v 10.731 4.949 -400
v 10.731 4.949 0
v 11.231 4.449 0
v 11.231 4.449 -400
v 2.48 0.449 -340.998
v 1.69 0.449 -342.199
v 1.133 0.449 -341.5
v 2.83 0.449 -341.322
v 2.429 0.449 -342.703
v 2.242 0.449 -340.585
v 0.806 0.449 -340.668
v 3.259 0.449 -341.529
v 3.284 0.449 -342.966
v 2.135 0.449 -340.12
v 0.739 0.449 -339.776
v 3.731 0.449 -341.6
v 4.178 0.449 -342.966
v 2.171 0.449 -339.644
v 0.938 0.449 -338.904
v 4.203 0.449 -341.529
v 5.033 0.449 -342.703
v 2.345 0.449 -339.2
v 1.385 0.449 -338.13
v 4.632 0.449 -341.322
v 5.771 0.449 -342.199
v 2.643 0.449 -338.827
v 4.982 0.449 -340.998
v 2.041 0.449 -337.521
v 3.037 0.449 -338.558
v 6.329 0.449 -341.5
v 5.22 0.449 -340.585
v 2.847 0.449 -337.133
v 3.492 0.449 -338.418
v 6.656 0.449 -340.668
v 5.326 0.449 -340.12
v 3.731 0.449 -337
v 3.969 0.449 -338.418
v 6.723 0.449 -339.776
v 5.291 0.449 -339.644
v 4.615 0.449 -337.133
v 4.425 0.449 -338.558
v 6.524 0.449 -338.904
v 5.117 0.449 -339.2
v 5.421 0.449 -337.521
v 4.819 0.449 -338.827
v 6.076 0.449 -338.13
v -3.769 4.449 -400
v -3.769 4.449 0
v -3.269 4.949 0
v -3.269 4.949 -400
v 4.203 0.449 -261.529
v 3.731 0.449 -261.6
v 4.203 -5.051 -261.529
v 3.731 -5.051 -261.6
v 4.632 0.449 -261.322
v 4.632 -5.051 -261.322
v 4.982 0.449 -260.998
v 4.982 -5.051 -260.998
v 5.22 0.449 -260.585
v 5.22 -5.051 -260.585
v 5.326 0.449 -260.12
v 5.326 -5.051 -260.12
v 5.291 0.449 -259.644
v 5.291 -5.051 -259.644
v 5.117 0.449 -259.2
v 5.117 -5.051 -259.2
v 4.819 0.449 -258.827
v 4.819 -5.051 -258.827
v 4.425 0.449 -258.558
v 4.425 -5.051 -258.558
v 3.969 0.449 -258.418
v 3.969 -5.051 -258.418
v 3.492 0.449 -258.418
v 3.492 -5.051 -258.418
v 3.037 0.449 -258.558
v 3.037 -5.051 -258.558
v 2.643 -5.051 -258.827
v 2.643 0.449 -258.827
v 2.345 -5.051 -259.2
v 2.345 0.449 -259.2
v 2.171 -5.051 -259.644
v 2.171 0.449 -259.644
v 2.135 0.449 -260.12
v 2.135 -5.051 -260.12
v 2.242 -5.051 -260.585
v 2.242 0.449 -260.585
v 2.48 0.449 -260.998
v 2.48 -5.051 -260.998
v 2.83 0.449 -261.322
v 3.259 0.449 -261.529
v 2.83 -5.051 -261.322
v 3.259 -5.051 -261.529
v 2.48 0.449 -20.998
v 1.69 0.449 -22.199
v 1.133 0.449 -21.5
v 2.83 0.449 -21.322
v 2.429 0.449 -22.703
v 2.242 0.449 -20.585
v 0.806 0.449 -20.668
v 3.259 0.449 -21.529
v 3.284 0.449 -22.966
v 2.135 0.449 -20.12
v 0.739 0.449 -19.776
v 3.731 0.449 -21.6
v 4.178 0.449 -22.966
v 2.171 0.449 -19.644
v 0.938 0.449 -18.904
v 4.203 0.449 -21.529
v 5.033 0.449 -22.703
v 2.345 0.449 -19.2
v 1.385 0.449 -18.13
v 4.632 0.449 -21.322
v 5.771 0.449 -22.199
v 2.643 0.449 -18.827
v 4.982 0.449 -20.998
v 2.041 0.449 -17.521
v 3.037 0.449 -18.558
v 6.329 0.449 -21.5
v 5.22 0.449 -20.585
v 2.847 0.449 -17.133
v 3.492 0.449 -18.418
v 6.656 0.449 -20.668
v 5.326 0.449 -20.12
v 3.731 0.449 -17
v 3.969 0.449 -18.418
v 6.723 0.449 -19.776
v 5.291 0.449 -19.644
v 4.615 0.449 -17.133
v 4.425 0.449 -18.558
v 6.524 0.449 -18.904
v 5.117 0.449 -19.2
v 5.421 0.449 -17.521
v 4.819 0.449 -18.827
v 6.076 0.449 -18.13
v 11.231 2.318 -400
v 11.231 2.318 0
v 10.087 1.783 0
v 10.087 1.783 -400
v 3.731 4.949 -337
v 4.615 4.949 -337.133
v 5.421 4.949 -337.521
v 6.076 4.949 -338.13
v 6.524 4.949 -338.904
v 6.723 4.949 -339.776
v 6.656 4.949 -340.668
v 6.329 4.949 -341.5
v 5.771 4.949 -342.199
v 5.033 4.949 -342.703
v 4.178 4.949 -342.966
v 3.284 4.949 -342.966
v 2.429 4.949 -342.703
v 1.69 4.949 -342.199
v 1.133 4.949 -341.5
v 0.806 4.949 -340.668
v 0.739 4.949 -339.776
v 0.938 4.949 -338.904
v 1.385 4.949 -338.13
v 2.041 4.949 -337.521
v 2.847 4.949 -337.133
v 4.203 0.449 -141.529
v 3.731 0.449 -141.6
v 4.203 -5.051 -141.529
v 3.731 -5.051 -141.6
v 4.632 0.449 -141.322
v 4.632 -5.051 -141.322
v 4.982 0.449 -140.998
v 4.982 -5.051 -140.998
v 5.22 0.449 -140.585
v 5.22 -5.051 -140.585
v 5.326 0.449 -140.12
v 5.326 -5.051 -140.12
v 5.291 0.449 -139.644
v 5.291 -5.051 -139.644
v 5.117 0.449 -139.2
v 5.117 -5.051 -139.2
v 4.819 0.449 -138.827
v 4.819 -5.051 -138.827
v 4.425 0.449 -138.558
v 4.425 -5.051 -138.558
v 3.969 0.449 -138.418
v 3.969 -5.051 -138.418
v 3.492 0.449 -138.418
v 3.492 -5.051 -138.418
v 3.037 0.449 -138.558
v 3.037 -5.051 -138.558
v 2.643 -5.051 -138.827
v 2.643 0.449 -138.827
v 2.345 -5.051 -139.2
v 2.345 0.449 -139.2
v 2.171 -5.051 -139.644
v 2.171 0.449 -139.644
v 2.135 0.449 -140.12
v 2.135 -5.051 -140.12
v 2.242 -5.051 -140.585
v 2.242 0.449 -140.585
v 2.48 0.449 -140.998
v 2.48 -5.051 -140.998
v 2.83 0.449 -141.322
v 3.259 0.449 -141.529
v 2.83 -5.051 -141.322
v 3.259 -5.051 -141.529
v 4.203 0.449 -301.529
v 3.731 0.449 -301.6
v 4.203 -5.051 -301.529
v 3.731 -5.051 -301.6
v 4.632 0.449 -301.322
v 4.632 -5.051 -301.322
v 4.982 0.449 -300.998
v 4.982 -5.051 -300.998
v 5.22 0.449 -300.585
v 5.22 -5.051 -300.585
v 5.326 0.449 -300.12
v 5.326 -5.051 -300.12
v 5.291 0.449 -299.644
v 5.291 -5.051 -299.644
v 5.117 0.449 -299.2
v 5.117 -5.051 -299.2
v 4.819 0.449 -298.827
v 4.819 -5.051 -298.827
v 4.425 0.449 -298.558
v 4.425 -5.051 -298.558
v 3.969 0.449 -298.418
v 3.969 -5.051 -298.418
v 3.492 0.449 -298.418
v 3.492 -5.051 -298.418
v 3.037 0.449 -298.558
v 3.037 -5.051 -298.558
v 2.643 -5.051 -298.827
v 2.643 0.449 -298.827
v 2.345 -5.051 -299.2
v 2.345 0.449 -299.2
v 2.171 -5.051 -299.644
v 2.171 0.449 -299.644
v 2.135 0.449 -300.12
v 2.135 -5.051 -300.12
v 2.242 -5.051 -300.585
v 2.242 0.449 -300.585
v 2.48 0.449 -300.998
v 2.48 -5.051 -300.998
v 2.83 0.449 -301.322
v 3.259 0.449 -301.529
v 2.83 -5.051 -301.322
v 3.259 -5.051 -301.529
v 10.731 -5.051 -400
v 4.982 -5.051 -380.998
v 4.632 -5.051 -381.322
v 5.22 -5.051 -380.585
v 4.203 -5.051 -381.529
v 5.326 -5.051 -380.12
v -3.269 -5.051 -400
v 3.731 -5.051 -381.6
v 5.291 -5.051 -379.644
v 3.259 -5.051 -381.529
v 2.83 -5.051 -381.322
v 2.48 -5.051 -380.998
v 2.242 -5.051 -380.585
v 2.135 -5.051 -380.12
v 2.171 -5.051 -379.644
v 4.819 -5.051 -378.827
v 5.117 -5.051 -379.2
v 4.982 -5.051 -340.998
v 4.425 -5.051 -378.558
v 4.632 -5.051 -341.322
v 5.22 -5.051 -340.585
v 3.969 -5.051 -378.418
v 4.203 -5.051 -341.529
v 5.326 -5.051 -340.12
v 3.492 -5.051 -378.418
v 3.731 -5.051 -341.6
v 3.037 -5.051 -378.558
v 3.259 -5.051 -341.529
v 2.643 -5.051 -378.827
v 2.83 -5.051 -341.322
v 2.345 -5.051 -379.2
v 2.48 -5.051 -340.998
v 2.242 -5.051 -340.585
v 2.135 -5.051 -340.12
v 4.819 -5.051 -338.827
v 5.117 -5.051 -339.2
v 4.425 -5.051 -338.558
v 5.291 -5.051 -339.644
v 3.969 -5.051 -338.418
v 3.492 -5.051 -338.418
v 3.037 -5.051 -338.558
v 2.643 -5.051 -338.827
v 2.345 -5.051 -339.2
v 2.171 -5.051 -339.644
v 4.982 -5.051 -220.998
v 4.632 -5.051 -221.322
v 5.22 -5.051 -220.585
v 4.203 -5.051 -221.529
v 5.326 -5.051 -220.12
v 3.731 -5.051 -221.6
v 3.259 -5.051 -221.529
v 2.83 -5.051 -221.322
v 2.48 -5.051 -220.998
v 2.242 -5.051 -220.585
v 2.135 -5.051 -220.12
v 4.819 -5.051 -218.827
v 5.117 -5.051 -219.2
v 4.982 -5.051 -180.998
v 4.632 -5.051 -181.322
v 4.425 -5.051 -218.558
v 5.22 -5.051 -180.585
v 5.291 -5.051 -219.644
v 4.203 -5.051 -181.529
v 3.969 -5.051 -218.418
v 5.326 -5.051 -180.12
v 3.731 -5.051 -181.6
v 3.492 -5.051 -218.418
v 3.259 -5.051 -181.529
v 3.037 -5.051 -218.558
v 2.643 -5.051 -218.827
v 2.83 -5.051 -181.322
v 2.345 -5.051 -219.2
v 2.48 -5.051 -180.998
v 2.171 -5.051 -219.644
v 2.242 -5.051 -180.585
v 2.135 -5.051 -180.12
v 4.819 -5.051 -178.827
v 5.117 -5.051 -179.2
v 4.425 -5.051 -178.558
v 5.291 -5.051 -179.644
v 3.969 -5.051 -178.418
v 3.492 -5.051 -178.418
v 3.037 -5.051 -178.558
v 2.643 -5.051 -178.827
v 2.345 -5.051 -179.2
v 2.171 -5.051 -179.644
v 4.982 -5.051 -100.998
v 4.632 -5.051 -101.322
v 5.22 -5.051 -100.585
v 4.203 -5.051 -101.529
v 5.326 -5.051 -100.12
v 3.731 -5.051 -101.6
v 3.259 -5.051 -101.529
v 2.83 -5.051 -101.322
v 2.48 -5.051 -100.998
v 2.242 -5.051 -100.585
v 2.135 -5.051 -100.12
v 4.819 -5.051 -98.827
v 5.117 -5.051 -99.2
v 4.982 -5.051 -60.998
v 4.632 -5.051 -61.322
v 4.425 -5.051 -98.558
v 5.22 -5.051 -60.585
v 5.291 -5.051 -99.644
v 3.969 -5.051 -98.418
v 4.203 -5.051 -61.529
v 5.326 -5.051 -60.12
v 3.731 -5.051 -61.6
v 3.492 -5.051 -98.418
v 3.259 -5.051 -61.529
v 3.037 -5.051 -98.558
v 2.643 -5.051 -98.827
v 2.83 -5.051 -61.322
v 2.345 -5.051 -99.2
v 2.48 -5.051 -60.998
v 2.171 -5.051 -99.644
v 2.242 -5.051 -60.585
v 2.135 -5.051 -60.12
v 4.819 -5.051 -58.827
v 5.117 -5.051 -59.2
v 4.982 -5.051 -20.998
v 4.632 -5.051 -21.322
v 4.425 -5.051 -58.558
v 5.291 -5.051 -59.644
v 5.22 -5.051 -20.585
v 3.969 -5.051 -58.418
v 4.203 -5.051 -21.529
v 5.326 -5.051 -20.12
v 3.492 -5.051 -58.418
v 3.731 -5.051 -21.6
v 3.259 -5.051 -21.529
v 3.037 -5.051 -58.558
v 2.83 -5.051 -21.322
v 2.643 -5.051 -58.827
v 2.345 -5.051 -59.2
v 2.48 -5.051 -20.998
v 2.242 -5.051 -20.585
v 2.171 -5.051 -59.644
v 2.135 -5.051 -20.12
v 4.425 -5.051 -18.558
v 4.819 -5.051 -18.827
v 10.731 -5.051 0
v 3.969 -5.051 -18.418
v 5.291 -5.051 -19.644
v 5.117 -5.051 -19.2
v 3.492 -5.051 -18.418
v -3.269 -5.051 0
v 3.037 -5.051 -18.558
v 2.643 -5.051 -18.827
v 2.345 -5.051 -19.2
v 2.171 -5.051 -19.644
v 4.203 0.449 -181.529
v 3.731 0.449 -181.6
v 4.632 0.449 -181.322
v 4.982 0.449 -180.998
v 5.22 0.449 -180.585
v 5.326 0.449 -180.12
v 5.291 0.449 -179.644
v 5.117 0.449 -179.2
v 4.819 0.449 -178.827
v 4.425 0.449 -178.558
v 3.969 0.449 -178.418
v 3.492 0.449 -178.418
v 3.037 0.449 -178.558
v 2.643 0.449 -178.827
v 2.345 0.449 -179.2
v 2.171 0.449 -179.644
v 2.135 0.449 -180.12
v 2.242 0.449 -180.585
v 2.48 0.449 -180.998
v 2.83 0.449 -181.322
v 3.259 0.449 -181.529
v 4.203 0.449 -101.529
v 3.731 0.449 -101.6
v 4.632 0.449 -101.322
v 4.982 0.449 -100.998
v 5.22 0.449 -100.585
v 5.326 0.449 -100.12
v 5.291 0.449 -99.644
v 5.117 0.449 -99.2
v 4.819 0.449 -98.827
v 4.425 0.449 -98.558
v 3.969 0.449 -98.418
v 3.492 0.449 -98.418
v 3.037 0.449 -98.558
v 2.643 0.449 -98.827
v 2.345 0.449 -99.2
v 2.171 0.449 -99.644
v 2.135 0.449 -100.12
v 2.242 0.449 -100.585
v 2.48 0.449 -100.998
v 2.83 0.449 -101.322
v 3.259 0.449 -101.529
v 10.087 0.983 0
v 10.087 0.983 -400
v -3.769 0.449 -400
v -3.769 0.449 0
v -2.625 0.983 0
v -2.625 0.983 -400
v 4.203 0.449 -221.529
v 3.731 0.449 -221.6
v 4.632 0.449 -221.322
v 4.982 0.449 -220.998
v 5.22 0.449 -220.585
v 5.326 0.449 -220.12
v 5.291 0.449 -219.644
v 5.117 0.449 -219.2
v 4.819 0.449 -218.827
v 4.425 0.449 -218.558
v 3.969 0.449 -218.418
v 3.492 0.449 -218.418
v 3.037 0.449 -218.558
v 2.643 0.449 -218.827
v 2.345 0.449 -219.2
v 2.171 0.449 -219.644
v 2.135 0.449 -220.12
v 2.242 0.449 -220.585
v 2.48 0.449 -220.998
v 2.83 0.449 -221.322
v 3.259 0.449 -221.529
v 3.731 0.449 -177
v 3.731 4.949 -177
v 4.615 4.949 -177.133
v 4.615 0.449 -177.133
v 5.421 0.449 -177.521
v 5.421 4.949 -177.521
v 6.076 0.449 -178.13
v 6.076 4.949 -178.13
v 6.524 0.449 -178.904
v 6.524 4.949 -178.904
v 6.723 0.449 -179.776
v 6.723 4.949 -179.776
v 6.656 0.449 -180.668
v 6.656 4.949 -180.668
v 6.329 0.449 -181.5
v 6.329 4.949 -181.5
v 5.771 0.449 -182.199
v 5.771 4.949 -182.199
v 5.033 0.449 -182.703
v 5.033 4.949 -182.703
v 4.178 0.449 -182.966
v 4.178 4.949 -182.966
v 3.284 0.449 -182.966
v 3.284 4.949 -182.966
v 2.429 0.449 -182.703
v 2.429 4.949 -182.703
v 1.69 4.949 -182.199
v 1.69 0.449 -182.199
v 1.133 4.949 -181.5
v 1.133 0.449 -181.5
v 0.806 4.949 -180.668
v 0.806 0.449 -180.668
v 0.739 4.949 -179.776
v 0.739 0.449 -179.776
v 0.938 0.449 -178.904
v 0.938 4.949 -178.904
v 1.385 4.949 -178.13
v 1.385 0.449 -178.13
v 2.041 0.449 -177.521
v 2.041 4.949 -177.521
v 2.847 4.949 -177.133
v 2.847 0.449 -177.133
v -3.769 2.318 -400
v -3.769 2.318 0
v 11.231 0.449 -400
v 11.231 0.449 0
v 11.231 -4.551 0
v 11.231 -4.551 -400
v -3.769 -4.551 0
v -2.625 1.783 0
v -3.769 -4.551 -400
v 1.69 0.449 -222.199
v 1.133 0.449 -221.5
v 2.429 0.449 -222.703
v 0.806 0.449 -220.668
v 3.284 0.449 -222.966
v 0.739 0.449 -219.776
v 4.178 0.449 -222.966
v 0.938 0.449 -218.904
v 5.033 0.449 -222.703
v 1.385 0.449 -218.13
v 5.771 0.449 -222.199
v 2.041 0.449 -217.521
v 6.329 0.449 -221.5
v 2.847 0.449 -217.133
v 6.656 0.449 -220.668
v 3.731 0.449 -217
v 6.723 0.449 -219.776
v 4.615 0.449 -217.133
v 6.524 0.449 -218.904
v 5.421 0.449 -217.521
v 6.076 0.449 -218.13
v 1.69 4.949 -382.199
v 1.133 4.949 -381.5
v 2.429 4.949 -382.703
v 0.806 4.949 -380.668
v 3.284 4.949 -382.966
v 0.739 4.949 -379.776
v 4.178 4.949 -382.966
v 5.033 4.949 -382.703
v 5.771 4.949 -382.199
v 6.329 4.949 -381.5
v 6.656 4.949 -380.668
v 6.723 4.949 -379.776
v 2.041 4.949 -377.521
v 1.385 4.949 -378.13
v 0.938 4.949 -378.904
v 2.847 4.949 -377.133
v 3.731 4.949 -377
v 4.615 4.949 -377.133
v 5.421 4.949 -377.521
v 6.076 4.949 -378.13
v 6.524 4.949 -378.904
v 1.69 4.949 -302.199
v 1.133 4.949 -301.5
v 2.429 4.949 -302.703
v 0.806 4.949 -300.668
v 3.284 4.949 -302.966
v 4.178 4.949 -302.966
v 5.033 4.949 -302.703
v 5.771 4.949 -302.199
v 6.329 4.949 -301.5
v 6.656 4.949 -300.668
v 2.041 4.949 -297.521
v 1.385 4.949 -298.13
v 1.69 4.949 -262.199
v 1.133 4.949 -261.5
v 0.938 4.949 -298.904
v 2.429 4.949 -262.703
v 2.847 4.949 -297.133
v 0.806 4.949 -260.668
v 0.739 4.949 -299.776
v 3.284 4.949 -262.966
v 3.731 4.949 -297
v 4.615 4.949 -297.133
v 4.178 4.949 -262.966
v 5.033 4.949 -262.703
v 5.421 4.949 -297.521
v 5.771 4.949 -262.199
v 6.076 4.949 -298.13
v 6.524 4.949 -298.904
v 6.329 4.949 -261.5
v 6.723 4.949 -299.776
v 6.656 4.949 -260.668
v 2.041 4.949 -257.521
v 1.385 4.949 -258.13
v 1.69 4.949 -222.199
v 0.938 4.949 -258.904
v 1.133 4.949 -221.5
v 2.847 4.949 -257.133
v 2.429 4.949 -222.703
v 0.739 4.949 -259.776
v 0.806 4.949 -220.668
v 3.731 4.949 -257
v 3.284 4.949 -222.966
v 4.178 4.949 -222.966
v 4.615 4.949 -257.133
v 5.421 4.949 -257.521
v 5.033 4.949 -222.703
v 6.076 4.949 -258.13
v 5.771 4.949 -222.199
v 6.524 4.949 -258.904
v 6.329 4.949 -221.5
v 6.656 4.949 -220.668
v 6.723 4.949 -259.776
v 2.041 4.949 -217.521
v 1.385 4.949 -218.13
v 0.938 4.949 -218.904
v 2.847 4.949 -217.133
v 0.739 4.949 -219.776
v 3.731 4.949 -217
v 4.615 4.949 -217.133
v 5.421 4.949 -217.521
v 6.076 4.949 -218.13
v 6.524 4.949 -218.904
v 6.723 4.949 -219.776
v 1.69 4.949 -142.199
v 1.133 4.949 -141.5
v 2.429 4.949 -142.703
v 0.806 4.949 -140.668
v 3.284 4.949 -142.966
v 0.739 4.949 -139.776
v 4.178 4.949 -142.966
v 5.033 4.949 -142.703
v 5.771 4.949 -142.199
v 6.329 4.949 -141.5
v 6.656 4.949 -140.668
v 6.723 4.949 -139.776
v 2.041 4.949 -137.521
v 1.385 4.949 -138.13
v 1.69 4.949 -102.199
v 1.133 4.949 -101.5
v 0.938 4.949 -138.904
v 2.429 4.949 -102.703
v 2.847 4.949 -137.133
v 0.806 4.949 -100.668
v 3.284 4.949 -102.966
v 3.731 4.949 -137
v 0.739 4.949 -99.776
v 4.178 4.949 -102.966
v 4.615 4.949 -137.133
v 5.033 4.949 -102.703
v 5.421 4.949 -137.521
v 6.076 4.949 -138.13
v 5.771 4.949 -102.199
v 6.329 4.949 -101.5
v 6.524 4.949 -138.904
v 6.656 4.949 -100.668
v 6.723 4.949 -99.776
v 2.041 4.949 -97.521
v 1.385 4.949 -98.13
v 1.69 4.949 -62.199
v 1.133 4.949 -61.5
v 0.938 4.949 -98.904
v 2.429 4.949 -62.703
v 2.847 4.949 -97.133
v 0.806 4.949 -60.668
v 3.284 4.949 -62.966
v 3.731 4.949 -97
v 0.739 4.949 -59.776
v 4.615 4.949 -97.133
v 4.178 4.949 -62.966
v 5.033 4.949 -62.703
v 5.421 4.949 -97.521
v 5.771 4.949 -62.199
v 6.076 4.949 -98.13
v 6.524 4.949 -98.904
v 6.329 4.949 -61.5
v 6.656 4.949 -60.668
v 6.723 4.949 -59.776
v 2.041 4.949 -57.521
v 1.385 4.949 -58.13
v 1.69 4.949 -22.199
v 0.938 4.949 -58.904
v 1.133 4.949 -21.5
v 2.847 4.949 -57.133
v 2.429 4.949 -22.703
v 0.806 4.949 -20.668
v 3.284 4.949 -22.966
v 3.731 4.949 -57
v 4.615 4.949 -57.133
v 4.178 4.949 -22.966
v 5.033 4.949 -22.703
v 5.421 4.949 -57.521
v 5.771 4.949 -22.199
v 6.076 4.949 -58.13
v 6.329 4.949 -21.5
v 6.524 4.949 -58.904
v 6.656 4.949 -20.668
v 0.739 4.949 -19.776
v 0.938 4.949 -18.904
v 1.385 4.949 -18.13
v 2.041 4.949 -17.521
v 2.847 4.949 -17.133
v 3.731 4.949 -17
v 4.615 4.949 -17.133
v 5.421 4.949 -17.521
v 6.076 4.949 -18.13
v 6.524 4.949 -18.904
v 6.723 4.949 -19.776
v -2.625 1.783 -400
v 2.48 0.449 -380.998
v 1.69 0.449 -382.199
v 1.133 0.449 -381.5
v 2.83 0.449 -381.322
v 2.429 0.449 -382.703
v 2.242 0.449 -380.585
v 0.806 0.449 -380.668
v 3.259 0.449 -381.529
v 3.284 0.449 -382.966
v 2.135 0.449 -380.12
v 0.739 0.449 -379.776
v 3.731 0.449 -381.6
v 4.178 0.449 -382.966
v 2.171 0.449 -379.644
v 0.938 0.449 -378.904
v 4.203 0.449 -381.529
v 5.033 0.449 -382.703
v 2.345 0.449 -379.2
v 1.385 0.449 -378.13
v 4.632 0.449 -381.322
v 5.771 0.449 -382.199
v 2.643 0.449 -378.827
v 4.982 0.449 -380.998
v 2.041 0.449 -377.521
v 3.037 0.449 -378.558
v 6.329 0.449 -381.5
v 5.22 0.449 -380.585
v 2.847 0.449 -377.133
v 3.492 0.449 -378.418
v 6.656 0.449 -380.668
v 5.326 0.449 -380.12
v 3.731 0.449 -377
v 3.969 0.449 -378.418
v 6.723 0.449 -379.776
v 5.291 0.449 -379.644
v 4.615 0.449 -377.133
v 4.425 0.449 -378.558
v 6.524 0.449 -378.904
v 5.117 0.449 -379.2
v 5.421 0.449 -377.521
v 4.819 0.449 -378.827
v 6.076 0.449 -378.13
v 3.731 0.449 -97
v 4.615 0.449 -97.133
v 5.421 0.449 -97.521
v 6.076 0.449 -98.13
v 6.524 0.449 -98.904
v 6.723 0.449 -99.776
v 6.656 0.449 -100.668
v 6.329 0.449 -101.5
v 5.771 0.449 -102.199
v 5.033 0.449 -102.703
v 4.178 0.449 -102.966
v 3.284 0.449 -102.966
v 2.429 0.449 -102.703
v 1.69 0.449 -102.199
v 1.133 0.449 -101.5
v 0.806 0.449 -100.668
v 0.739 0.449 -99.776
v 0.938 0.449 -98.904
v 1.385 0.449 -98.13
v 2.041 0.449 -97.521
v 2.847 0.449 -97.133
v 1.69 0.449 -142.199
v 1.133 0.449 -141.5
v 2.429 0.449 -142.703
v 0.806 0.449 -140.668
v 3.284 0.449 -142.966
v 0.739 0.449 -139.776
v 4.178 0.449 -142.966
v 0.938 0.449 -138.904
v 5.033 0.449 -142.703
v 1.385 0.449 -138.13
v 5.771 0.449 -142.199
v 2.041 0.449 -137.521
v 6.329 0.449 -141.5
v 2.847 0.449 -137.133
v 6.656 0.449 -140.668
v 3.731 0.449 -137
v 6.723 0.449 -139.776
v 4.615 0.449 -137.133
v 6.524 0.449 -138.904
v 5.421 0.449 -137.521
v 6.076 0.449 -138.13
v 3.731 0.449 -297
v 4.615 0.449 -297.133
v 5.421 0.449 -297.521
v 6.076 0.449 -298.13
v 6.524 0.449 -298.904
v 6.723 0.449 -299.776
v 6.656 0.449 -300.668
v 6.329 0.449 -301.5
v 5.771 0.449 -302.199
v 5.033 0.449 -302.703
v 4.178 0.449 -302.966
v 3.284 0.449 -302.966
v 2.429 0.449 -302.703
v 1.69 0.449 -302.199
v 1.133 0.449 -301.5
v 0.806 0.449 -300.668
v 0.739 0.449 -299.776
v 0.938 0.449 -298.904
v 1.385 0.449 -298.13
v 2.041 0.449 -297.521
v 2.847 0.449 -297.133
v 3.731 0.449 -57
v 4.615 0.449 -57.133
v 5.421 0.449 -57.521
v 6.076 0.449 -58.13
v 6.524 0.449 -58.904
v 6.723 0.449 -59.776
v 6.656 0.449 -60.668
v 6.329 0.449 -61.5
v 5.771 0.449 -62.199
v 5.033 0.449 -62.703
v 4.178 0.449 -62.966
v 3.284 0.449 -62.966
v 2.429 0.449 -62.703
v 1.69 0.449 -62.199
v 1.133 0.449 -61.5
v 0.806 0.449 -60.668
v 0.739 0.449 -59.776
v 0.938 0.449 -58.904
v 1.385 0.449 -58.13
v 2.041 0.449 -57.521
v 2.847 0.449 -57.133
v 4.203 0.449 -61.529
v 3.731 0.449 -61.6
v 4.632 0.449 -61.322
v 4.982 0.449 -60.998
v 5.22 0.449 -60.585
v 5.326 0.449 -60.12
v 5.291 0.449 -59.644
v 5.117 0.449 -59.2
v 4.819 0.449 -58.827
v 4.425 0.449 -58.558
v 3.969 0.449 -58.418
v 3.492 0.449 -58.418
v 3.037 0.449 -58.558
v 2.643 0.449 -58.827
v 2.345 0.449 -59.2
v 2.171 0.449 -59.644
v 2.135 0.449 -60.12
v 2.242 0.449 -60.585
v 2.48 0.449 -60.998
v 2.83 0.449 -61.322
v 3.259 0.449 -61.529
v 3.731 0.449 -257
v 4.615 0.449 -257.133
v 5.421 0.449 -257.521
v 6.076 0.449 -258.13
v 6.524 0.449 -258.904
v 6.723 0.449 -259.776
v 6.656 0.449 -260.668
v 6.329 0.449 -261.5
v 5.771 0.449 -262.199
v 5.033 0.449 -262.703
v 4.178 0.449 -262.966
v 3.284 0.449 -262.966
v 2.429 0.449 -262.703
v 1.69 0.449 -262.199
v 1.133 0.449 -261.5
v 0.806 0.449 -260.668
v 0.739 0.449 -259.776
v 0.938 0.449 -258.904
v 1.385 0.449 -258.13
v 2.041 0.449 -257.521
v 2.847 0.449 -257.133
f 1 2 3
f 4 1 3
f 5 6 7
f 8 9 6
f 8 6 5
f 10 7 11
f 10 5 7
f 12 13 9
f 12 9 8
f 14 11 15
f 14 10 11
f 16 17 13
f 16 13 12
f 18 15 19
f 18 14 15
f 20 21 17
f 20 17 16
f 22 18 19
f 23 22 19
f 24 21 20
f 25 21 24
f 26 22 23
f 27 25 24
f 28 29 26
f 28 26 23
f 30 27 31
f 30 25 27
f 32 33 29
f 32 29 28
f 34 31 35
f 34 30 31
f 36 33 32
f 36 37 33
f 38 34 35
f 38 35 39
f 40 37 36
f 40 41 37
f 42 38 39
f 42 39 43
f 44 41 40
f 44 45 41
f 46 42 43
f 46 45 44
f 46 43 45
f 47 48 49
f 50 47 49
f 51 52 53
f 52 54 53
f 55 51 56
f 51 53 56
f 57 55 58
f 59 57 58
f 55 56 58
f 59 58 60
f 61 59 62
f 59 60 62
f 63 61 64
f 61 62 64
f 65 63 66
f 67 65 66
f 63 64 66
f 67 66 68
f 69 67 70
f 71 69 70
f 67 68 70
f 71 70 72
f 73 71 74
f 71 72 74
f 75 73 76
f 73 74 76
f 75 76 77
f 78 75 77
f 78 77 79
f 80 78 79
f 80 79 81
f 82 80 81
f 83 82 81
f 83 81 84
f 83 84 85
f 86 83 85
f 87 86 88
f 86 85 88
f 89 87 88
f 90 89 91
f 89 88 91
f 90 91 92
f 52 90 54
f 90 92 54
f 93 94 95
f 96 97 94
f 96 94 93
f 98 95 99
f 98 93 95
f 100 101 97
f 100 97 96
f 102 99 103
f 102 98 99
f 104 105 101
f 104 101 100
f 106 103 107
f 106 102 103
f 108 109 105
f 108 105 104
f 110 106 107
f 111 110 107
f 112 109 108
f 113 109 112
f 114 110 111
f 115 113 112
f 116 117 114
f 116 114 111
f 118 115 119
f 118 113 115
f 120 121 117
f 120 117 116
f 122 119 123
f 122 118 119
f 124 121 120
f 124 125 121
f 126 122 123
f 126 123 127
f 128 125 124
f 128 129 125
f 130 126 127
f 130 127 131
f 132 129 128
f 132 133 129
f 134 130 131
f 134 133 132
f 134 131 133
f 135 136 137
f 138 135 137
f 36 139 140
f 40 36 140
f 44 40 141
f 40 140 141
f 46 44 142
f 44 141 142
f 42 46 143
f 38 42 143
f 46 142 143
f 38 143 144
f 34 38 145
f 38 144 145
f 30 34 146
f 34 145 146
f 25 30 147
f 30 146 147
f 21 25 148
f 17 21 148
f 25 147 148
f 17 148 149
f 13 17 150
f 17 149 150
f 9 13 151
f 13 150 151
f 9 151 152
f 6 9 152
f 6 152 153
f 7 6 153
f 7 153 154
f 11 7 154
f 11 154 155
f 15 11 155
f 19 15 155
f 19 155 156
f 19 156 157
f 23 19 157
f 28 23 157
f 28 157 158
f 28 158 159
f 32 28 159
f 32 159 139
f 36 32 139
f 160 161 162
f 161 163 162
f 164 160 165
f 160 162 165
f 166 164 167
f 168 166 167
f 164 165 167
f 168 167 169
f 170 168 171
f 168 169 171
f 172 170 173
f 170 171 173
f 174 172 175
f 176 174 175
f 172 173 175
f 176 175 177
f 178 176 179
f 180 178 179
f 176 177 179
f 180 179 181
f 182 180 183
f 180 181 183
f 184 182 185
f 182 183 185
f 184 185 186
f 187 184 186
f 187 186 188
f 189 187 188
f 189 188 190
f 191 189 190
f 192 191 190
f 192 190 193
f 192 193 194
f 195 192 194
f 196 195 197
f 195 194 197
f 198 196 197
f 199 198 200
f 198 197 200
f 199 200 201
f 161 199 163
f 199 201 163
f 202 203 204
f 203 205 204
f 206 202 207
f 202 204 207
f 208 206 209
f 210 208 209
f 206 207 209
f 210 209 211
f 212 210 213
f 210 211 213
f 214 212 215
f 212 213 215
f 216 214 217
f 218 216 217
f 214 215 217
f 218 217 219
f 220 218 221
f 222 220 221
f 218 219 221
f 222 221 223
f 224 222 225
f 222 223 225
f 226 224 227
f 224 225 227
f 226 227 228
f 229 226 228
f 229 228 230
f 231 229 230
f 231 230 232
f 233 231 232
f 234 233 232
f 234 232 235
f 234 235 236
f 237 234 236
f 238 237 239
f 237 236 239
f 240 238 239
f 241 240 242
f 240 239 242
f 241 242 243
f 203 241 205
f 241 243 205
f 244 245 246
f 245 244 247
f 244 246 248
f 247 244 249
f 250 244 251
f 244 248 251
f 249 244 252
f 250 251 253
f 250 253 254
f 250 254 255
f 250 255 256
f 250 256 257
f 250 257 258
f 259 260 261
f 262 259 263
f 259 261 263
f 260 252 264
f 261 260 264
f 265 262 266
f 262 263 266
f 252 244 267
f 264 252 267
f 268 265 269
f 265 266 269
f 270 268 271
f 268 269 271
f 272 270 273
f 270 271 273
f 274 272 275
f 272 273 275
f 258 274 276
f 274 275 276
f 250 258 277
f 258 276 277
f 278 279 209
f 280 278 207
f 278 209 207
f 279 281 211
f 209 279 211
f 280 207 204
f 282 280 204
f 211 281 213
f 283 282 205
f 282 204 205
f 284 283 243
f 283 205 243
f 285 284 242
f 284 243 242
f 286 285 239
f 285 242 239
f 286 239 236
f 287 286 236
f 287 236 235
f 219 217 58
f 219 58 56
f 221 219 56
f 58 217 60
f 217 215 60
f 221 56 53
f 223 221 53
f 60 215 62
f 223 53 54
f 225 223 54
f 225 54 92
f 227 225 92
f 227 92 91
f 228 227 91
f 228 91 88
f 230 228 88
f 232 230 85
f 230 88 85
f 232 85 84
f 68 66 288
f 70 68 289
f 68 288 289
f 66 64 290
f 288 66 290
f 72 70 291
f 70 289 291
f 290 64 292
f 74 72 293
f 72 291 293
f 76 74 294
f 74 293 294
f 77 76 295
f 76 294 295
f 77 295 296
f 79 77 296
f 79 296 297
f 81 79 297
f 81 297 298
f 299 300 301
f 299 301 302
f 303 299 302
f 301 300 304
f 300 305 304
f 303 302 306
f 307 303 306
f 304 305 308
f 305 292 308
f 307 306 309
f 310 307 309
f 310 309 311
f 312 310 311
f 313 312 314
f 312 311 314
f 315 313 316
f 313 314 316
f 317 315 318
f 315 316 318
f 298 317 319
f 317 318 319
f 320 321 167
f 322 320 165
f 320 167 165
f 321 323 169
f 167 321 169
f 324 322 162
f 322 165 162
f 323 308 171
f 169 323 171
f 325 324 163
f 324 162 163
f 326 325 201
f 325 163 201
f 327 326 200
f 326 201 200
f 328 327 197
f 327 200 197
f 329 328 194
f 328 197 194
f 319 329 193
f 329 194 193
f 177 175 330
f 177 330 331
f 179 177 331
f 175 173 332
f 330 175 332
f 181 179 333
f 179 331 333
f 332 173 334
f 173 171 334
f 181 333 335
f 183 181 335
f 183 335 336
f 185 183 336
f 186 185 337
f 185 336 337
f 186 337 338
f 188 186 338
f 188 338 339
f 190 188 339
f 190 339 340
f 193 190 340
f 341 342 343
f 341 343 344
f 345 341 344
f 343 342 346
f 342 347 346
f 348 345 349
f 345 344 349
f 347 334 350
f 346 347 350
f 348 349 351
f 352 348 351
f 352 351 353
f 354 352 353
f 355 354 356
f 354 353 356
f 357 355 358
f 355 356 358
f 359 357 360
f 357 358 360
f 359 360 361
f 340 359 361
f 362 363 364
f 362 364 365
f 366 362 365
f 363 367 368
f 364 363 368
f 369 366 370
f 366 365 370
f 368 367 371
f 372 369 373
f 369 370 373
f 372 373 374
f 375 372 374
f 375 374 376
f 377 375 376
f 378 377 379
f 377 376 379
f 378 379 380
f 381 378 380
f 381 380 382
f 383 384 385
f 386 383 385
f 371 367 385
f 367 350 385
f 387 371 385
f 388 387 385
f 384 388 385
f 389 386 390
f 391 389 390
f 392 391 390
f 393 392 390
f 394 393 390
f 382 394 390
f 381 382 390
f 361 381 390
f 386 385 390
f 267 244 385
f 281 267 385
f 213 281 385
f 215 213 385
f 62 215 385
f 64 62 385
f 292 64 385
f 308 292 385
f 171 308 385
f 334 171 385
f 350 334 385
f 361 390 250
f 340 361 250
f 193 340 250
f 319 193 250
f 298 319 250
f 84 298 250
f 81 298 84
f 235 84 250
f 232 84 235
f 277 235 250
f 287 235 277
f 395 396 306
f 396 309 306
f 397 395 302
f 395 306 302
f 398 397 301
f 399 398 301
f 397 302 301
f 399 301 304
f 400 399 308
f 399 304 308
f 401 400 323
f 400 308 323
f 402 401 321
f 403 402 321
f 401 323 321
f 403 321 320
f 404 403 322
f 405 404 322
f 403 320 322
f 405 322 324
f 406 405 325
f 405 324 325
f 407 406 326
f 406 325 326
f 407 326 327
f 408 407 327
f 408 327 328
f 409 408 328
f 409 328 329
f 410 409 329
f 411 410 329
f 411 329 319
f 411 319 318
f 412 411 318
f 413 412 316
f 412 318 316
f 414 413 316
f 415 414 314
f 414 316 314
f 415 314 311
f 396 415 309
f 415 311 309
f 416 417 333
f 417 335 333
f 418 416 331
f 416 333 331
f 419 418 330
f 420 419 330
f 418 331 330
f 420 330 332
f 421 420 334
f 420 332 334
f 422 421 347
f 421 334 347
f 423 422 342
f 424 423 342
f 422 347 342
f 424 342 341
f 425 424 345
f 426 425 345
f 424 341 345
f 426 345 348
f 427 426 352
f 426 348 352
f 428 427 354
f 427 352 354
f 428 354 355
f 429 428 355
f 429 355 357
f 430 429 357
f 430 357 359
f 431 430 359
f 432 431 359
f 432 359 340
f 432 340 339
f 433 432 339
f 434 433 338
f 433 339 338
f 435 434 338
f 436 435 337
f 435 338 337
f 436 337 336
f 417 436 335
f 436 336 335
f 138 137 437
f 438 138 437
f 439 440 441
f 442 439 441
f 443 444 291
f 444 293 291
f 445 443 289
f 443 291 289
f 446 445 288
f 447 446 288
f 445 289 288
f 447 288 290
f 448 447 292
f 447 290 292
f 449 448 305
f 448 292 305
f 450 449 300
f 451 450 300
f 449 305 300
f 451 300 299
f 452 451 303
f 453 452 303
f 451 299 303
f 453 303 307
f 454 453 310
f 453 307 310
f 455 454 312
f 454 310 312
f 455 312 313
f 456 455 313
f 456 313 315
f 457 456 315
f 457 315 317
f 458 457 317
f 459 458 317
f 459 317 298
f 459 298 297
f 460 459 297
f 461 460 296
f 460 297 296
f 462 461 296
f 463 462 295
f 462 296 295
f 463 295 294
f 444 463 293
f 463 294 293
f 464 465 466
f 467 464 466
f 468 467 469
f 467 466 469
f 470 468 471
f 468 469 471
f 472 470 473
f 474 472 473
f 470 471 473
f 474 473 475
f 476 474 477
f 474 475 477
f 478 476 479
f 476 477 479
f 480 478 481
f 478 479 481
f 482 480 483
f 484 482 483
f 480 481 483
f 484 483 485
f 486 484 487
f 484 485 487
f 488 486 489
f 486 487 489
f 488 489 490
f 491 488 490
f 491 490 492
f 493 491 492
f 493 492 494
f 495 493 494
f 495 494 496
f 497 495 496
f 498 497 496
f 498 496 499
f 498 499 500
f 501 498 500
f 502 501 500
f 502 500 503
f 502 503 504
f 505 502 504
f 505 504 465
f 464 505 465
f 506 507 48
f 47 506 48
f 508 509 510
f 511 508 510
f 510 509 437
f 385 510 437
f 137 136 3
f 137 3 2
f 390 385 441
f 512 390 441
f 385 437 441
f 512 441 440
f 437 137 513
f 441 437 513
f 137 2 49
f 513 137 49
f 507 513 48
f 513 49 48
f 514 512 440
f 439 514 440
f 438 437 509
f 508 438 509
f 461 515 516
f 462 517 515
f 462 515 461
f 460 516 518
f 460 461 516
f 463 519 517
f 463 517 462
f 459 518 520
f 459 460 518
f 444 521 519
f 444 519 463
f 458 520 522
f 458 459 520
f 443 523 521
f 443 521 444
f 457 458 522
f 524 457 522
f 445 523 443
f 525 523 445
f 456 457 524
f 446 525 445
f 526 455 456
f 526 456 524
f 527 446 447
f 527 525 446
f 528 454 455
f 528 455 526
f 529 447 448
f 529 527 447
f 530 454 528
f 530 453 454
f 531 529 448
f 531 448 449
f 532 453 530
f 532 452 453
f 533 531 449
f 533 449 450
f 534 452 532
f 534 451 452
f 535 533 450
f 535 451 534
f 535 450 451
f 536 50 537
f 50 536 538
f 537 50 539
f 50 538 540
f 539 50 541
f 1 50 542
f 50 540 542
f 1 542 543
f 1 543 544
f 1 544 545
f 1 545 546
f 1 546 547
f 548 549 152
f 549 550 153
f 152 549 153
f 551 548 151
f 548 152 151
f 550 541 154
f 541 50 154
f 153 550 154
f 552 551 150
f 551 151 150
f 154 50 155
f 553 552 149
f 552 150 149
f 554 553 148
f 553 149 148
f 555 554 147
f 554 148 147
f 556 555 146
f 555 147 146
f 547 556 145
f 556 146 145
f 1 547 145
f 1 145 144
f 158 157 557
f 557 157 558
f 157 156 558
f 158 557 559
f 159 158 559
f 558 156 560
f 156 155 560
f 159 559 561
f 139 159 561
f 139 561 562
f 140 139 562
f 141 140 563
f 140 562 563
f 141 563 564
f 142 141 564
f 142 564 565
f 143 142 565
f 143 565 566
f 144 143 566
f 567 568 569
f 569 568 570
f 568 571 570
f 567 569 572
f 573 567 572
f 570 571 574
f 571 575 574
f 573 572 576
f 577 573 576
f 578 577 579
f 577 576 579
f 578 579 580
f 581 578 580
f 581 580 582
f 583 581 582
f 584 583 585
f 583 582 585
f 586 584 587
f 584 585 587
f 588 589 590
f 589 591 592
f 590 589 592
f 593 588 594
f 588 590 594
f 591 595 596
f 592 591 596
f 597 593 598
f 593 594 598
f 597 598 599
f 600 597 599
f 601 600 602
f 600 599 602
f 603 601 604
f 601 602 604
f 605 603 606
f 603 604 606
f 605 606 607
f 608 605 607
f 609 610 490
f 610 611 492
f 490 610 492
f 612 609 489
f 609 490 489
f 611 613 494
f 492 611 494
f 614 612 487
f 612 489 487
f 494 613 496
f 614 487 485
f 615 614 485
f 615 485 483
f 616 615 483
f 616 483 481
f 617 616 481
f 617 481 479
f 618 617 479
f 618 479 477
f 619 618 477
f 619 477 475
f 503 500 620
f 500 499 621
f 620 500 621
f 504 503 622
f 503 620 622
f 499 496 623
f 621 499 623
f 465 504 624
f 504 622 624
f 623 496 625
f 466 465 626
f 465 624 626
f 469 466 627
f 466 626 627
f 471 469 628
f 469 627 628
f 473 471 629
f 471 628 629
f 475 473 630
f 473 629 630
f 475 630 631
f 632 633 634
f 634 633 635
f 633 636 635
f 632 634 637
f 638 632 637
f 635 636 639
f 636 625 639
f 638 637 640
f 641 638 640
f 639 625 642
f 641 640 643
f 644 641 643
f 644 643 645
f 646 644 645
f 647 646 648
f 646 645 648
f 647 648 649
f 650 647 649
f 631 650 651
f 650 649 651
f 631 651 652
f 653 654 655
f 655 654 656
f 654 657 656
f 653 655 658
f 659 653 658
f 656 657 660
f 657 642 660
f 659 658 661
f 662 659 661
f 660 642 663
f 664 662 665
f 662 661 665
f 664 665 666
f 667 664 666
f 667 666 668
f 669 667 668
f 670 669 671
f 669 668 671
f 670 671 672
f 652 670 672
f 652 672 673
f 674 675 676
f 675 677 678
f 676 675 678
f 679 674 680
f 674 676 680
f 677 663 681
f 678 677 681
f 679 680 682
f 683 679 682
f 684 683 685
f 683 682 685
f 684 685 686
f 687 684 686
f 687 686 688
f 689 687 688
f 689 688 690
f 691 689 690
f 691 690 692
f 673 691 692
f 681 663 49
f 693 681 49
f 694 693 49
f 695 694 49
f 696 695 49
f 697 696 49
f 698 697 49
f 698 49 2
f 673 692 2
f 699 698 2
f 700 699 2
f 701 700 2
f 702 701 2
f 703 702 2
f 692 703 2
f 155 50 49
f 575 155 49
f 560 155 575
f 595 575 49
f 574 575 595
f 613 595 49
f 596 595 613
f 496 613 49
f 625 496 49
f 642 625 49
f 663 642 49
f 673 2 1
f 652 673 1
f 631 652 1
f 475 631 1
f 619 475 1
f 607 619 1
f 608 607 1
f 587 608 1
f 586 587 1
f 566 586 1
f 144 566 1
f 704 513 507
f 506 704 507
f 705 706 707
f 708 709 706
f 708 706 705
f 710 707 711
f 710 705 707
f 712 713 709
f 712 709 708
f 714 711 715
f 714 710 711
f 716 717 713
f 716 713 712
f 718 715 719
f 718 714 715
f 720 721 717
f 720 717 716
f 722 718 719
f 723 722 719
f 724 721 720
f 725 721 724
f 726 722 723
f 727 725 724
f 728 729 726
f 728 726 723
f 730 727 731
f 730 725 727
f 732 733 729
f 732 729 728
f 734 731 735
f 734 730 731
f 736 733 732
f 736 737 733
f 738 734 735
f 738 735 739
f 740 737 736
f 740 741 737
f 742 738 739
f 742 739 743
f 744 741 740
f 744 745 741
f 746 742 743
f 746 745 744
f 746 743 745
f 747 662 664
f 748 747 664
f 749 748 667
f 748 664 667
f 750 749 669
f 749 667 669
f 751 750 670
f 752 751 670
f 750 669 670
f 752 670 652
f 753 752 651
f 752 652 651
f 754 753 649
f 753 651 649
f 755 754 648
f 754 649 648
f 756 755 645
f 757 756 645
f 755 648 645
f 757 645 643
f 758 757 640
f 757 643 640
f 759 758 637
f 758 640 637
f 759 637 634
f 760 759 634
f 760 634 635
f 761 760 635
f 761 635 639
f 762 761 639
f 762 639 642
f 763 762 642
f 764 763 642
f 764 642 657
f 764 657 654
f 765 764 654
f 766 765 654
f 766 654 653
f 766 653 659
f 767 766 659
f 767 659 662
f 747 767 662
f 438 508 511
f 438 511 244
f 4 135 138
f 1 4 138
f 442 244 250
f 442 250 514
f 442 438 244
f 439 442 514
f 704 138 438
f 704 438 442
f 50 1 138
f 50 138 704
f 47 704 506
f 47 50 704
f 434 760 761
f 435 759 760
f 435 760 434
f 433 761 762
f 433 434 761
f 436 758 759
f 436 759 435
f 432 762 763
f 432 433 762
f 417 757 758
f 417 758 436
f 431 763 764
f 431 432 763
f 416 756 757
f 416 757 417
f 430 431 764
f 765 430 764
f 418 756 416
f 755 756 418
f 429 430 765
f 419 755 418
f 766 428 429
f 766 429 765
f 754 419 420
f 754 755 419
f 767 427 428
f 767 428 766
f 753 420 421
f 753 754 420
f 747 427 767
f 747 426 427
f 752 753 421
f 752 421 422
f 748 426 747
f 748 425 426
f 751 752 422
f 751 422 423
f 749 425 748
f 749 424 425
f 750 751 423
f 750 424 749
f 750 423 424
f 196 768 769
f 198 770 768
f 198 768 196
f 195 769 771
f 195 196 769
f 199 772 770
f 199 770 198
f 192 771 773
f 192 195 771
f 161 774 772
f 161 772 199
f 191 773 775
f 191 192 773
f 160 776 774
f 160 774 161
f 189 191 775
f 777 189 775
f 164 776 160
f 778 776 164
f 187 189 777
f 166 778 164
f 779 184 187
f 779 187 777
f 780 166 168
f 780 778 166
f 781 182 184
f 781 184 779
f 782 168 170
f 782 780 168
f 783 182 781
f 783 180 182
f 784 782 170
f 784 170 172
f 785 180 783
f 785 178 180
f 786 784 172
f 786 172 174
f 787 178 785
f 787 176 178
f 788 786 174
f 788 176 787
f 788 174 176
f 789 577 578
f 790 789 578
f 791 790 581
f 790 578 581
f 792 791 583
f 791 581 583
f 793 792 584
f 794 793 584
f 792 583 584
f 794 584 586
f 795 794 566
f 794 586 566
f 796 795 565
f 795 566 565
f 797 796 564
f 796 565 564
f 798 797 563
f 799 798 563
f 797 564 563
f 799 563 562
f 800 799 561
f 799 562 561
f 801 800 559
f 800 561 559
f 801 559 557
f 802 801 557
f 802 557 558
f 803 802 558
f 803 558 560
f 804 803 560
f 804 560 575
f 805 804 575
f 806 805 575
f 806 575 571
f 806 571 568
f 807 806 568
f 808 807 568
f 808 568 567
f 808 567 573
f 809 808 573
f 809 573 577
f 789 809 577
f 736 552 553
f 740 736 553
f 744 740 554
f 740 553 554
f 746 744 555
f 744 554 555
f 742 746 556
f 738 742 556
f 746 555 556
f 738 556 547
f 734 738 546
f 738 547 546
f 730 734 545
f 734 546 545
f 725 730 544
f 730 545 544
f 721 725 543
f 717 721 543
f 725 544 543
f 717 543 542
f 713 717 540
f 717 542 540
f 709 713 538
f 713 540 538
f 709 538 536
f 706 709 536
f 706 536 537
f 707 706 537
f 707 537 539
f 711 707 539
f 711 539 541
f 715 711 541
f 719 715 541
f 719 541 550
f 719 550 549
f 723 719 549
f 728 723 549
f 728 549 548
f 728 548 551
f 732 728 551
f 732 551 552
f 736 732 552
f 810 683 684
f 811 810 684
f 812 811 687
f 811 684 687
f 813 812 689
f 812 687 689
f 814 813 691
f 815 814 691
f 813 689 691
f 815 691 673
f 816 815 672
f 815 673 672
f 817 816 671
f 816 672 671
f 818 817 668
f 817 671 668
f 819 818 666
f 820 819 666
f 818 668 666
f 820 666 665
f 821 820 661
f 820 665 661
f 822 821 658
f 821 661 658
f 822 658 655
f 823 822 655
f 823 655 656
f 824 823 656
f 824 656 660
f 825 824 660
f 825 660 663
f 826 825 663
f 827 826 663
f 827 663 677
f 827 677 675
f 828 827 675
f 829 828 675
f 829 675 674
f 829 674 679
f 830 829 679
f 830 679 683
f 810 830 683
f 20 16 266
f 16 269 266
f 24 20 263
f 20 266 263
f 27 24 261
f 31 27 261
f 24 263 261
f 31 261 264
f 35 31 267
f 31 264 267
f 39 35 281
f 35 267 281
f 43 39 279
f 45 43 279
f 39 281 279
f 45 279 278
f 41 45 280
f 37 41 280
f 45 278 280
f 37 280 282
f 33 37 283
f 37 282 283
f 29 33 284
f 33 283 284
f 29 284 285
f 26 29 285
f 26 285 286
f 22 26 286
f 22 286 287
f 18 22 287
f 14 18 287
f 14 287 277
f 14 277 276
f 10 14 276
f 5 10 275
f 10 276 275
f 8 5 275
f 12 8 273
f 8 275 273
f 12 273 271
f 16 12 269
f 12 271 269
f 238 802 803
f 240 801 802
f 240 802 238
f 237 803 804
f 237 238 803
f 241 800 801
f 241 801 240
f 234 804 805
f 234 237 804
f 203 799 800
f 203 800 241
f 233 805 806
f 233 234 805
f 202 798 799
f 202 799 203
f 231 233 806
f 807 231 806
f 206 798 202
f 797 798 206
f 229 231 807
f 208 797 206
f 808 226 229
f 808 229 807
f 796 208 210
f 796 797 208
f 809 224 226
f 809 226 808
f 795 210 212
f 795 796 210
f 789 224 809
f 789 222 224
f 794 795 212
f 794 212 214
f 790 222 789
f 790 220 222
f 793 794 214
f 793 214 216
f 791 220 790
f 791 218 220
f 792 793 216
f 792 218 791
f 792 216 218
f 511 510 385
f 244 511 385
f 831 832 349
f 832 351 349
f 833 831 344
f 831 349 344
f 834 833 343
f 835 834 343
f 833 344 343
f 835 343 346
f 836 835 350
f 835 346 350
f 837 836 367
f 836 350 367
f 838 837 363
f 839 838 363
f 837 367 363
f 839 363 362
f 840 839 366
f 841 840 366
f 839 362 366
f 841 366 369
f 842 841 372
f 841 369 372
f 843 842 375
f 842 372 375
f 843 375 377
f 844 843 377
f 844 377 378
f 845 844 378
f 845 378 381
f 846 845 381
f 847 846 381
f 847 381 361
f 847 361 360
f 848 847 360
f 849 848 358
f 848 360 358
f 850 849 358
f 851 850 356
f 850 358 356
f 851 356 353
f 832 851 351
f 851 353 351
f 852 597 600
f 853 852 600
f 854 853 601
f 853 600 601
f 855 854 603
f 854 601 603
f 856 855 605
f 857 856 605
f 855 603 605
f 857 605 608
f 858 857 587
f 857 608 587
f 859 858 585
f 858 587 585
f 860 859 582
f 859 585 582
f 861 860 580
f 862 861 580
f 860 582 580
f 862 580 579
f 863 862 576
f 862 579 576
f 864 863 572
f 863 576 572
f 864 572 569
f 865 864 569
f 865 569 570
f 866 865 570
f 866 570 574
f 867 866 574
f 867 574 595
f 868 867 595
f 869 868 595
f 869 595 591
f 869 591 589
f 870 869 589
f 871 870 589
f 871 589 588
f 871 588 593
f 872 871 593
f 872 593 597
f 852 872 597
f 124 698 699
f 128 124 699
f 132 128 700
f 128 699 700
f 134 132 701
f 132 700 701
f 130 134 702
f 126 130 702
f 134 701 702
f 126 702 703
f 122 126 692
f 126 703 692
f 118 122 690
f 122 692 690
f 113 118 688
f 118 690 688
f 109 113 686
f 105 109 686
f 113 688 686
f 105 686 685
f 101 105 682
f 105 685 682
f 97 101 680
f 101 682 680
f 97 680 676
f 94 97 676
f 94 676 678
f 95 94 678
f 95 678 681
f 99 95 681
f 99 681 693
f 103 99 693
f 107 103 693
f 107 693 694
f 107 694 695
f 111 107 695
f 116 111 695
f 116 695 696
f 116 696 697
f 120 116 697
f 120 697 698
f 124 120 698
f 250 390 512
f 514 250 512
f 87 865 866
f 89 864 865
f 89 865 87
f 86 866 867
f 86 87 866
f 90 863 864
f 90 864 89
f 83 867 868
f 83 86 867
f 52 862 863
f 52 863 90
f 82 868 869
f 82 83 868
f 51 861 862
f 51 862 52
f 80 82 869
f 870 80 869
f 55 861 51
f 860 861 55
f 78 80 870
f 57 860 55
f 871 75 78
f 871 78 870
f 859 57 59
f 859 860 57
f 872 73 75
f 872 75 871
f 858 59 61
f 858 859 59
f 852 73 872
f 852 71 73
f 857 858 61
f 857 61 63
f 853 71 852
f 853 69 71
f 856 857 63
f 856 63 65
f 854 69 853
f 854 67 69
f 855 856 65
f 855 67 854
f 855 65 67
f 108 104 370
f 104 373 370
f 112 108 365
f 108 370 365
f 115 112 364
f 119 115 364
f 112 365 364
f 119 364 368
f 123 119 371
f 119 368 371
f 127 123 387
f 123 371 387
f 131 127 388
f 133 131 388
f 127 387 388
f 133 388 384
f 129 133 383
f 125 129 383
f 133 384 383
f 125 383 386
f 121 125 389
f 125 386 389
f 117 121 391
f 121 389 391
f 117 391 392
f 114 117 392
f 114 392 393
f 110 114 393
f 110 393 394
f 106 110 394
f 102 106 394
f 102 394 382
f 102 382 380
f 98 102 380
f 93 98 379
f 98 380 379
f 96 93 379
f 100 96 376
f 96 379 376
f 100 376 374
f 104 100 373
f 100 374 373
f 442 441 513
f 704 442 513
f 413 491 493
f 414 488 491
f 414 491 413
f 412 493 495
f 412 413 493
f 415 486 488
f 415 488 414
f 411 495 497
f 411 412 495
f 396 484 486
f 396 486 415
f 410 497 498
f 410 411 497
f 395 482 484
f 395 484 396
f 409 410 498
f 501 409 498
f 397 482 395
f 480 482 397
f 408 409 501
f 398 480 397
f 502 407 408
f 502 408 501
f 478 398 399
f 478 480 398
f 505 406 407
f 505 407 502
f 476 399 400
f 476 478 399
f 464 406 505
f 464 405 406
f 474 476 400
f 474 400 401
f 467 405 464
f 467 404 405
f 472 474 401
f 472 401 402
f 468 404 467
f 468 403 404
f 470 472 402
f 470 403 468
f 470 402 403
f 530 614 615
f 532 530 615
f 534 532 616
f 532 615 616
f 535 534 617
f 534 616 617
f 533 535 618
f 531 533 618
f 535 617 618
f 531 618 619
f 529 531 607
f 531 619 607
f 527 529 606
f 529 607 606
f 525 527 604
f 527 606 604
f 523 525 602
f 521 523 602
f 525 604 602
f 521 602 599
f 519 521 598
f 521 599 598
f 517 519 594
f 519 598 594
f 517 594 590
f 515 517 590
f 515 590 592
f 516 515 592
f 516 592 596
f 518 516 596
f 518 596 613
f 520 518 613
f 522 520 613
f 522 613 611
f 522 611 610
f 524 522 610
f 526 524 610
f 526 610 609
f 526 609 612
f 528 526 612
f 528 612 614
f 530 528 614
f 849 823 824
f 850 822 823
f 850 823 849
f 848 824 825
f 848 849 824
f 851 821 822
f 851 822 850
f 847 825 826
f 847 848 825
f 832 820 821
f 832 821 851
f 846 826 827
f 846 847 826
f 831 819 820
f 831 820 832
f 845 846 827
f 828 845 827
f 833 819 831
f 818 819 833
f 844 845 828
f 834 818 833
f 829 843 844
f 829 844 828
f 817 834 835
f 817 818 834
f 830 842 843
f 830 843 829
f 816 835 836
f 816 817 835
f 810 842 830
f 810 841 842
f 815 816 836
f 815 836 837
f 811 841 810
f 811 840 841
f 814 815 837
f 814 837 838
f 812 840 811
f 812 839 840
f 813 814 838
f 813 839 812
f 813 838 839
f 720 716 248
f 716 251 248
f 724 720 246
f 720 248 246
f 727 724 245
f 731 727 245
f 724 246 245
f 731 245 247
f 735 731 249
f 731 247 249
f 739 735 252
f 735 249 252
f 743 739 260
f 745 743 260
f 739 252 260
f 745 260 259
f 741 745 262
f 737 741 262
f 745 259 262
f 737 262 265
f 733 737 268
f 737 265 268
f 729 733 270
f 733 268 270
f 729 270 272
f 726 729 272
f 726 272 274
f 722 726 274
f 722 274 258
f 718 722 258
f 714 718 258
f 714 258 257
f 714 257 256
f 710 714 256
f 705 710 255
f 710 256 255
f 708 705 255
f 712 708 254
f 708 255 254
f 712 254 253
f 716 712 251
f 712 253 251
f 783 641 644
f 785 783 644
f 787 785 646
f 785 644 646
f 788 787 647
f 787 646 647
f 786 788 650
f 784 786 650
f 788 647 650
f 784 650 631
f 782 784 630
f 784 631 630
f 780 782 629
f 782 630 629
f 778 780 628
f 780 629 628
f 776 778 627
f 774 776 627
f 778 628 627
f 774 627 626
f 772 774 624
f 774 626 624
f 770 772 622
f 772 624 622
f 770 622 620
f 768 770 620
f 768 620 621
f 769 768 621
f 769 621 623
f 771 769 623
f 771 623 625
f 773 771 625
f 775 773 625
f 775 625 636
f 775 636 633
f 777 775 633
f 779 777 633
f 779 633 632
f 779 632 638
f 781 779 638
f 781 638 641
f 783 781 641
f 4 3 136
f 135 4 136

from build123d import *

# Parameters (mm, degrees)
EXTRUDE_1_DEPTH           = 400
HOLE_WIZARD_2_D           = 3.2
HOLE_WIZARD_2_CBORE_D     = 6
HOLE_WIZARD_2_CBORE_DEPTH = 4.5


with BuildPart() as part:
    # 草图1 → 凸台-拉伸1 (new body)
    with BuildSketch(Plane.XY):
        Polygon((-3.269035533, 4.949238579), (10.730964467, 4.949238579), (11.230964467, 4.449238579), (11.230964467, 2.317517259), (10.086764657, 1.783377919), (10.086764657, 0.983377919), (11.230964467, 0.449238579), (11.230964467, -4.550761421), (10.730964467, -5.050761421), (-3.269035533, -5.050761421), (-3.769035533, -4.550761421), (-3.769035533, 0.449238579), (-2.624835723, 0.983377919), (-2.624835723, 1.783377919), (-3.769035533, 2.317517259), (-3.769035533, 4.449238579), align=None)
    extrude(amount=-EXTRUDE_1_DEPTH)

    # 孔2 (through all)
    with Locations(Plane(origin=(3.730964467, 4.949238579, -380), x_dir=(0, 0, 1), z_dir=(0, 1, 0))):
        with Locations((0, 0), (40, 0), (80, 0), (120, 0), (160, 0), (200, 0), (240, 0), (280, 0), (320, 0), (360, 0)):
            CounterBoreHole(HOLE_WIZARD_2_D / 2, HOLE_WIZARD_2_CBORE_D / 2, HOLE_WIZARD_2_CBORE_DEPTH)


solid = part.part
